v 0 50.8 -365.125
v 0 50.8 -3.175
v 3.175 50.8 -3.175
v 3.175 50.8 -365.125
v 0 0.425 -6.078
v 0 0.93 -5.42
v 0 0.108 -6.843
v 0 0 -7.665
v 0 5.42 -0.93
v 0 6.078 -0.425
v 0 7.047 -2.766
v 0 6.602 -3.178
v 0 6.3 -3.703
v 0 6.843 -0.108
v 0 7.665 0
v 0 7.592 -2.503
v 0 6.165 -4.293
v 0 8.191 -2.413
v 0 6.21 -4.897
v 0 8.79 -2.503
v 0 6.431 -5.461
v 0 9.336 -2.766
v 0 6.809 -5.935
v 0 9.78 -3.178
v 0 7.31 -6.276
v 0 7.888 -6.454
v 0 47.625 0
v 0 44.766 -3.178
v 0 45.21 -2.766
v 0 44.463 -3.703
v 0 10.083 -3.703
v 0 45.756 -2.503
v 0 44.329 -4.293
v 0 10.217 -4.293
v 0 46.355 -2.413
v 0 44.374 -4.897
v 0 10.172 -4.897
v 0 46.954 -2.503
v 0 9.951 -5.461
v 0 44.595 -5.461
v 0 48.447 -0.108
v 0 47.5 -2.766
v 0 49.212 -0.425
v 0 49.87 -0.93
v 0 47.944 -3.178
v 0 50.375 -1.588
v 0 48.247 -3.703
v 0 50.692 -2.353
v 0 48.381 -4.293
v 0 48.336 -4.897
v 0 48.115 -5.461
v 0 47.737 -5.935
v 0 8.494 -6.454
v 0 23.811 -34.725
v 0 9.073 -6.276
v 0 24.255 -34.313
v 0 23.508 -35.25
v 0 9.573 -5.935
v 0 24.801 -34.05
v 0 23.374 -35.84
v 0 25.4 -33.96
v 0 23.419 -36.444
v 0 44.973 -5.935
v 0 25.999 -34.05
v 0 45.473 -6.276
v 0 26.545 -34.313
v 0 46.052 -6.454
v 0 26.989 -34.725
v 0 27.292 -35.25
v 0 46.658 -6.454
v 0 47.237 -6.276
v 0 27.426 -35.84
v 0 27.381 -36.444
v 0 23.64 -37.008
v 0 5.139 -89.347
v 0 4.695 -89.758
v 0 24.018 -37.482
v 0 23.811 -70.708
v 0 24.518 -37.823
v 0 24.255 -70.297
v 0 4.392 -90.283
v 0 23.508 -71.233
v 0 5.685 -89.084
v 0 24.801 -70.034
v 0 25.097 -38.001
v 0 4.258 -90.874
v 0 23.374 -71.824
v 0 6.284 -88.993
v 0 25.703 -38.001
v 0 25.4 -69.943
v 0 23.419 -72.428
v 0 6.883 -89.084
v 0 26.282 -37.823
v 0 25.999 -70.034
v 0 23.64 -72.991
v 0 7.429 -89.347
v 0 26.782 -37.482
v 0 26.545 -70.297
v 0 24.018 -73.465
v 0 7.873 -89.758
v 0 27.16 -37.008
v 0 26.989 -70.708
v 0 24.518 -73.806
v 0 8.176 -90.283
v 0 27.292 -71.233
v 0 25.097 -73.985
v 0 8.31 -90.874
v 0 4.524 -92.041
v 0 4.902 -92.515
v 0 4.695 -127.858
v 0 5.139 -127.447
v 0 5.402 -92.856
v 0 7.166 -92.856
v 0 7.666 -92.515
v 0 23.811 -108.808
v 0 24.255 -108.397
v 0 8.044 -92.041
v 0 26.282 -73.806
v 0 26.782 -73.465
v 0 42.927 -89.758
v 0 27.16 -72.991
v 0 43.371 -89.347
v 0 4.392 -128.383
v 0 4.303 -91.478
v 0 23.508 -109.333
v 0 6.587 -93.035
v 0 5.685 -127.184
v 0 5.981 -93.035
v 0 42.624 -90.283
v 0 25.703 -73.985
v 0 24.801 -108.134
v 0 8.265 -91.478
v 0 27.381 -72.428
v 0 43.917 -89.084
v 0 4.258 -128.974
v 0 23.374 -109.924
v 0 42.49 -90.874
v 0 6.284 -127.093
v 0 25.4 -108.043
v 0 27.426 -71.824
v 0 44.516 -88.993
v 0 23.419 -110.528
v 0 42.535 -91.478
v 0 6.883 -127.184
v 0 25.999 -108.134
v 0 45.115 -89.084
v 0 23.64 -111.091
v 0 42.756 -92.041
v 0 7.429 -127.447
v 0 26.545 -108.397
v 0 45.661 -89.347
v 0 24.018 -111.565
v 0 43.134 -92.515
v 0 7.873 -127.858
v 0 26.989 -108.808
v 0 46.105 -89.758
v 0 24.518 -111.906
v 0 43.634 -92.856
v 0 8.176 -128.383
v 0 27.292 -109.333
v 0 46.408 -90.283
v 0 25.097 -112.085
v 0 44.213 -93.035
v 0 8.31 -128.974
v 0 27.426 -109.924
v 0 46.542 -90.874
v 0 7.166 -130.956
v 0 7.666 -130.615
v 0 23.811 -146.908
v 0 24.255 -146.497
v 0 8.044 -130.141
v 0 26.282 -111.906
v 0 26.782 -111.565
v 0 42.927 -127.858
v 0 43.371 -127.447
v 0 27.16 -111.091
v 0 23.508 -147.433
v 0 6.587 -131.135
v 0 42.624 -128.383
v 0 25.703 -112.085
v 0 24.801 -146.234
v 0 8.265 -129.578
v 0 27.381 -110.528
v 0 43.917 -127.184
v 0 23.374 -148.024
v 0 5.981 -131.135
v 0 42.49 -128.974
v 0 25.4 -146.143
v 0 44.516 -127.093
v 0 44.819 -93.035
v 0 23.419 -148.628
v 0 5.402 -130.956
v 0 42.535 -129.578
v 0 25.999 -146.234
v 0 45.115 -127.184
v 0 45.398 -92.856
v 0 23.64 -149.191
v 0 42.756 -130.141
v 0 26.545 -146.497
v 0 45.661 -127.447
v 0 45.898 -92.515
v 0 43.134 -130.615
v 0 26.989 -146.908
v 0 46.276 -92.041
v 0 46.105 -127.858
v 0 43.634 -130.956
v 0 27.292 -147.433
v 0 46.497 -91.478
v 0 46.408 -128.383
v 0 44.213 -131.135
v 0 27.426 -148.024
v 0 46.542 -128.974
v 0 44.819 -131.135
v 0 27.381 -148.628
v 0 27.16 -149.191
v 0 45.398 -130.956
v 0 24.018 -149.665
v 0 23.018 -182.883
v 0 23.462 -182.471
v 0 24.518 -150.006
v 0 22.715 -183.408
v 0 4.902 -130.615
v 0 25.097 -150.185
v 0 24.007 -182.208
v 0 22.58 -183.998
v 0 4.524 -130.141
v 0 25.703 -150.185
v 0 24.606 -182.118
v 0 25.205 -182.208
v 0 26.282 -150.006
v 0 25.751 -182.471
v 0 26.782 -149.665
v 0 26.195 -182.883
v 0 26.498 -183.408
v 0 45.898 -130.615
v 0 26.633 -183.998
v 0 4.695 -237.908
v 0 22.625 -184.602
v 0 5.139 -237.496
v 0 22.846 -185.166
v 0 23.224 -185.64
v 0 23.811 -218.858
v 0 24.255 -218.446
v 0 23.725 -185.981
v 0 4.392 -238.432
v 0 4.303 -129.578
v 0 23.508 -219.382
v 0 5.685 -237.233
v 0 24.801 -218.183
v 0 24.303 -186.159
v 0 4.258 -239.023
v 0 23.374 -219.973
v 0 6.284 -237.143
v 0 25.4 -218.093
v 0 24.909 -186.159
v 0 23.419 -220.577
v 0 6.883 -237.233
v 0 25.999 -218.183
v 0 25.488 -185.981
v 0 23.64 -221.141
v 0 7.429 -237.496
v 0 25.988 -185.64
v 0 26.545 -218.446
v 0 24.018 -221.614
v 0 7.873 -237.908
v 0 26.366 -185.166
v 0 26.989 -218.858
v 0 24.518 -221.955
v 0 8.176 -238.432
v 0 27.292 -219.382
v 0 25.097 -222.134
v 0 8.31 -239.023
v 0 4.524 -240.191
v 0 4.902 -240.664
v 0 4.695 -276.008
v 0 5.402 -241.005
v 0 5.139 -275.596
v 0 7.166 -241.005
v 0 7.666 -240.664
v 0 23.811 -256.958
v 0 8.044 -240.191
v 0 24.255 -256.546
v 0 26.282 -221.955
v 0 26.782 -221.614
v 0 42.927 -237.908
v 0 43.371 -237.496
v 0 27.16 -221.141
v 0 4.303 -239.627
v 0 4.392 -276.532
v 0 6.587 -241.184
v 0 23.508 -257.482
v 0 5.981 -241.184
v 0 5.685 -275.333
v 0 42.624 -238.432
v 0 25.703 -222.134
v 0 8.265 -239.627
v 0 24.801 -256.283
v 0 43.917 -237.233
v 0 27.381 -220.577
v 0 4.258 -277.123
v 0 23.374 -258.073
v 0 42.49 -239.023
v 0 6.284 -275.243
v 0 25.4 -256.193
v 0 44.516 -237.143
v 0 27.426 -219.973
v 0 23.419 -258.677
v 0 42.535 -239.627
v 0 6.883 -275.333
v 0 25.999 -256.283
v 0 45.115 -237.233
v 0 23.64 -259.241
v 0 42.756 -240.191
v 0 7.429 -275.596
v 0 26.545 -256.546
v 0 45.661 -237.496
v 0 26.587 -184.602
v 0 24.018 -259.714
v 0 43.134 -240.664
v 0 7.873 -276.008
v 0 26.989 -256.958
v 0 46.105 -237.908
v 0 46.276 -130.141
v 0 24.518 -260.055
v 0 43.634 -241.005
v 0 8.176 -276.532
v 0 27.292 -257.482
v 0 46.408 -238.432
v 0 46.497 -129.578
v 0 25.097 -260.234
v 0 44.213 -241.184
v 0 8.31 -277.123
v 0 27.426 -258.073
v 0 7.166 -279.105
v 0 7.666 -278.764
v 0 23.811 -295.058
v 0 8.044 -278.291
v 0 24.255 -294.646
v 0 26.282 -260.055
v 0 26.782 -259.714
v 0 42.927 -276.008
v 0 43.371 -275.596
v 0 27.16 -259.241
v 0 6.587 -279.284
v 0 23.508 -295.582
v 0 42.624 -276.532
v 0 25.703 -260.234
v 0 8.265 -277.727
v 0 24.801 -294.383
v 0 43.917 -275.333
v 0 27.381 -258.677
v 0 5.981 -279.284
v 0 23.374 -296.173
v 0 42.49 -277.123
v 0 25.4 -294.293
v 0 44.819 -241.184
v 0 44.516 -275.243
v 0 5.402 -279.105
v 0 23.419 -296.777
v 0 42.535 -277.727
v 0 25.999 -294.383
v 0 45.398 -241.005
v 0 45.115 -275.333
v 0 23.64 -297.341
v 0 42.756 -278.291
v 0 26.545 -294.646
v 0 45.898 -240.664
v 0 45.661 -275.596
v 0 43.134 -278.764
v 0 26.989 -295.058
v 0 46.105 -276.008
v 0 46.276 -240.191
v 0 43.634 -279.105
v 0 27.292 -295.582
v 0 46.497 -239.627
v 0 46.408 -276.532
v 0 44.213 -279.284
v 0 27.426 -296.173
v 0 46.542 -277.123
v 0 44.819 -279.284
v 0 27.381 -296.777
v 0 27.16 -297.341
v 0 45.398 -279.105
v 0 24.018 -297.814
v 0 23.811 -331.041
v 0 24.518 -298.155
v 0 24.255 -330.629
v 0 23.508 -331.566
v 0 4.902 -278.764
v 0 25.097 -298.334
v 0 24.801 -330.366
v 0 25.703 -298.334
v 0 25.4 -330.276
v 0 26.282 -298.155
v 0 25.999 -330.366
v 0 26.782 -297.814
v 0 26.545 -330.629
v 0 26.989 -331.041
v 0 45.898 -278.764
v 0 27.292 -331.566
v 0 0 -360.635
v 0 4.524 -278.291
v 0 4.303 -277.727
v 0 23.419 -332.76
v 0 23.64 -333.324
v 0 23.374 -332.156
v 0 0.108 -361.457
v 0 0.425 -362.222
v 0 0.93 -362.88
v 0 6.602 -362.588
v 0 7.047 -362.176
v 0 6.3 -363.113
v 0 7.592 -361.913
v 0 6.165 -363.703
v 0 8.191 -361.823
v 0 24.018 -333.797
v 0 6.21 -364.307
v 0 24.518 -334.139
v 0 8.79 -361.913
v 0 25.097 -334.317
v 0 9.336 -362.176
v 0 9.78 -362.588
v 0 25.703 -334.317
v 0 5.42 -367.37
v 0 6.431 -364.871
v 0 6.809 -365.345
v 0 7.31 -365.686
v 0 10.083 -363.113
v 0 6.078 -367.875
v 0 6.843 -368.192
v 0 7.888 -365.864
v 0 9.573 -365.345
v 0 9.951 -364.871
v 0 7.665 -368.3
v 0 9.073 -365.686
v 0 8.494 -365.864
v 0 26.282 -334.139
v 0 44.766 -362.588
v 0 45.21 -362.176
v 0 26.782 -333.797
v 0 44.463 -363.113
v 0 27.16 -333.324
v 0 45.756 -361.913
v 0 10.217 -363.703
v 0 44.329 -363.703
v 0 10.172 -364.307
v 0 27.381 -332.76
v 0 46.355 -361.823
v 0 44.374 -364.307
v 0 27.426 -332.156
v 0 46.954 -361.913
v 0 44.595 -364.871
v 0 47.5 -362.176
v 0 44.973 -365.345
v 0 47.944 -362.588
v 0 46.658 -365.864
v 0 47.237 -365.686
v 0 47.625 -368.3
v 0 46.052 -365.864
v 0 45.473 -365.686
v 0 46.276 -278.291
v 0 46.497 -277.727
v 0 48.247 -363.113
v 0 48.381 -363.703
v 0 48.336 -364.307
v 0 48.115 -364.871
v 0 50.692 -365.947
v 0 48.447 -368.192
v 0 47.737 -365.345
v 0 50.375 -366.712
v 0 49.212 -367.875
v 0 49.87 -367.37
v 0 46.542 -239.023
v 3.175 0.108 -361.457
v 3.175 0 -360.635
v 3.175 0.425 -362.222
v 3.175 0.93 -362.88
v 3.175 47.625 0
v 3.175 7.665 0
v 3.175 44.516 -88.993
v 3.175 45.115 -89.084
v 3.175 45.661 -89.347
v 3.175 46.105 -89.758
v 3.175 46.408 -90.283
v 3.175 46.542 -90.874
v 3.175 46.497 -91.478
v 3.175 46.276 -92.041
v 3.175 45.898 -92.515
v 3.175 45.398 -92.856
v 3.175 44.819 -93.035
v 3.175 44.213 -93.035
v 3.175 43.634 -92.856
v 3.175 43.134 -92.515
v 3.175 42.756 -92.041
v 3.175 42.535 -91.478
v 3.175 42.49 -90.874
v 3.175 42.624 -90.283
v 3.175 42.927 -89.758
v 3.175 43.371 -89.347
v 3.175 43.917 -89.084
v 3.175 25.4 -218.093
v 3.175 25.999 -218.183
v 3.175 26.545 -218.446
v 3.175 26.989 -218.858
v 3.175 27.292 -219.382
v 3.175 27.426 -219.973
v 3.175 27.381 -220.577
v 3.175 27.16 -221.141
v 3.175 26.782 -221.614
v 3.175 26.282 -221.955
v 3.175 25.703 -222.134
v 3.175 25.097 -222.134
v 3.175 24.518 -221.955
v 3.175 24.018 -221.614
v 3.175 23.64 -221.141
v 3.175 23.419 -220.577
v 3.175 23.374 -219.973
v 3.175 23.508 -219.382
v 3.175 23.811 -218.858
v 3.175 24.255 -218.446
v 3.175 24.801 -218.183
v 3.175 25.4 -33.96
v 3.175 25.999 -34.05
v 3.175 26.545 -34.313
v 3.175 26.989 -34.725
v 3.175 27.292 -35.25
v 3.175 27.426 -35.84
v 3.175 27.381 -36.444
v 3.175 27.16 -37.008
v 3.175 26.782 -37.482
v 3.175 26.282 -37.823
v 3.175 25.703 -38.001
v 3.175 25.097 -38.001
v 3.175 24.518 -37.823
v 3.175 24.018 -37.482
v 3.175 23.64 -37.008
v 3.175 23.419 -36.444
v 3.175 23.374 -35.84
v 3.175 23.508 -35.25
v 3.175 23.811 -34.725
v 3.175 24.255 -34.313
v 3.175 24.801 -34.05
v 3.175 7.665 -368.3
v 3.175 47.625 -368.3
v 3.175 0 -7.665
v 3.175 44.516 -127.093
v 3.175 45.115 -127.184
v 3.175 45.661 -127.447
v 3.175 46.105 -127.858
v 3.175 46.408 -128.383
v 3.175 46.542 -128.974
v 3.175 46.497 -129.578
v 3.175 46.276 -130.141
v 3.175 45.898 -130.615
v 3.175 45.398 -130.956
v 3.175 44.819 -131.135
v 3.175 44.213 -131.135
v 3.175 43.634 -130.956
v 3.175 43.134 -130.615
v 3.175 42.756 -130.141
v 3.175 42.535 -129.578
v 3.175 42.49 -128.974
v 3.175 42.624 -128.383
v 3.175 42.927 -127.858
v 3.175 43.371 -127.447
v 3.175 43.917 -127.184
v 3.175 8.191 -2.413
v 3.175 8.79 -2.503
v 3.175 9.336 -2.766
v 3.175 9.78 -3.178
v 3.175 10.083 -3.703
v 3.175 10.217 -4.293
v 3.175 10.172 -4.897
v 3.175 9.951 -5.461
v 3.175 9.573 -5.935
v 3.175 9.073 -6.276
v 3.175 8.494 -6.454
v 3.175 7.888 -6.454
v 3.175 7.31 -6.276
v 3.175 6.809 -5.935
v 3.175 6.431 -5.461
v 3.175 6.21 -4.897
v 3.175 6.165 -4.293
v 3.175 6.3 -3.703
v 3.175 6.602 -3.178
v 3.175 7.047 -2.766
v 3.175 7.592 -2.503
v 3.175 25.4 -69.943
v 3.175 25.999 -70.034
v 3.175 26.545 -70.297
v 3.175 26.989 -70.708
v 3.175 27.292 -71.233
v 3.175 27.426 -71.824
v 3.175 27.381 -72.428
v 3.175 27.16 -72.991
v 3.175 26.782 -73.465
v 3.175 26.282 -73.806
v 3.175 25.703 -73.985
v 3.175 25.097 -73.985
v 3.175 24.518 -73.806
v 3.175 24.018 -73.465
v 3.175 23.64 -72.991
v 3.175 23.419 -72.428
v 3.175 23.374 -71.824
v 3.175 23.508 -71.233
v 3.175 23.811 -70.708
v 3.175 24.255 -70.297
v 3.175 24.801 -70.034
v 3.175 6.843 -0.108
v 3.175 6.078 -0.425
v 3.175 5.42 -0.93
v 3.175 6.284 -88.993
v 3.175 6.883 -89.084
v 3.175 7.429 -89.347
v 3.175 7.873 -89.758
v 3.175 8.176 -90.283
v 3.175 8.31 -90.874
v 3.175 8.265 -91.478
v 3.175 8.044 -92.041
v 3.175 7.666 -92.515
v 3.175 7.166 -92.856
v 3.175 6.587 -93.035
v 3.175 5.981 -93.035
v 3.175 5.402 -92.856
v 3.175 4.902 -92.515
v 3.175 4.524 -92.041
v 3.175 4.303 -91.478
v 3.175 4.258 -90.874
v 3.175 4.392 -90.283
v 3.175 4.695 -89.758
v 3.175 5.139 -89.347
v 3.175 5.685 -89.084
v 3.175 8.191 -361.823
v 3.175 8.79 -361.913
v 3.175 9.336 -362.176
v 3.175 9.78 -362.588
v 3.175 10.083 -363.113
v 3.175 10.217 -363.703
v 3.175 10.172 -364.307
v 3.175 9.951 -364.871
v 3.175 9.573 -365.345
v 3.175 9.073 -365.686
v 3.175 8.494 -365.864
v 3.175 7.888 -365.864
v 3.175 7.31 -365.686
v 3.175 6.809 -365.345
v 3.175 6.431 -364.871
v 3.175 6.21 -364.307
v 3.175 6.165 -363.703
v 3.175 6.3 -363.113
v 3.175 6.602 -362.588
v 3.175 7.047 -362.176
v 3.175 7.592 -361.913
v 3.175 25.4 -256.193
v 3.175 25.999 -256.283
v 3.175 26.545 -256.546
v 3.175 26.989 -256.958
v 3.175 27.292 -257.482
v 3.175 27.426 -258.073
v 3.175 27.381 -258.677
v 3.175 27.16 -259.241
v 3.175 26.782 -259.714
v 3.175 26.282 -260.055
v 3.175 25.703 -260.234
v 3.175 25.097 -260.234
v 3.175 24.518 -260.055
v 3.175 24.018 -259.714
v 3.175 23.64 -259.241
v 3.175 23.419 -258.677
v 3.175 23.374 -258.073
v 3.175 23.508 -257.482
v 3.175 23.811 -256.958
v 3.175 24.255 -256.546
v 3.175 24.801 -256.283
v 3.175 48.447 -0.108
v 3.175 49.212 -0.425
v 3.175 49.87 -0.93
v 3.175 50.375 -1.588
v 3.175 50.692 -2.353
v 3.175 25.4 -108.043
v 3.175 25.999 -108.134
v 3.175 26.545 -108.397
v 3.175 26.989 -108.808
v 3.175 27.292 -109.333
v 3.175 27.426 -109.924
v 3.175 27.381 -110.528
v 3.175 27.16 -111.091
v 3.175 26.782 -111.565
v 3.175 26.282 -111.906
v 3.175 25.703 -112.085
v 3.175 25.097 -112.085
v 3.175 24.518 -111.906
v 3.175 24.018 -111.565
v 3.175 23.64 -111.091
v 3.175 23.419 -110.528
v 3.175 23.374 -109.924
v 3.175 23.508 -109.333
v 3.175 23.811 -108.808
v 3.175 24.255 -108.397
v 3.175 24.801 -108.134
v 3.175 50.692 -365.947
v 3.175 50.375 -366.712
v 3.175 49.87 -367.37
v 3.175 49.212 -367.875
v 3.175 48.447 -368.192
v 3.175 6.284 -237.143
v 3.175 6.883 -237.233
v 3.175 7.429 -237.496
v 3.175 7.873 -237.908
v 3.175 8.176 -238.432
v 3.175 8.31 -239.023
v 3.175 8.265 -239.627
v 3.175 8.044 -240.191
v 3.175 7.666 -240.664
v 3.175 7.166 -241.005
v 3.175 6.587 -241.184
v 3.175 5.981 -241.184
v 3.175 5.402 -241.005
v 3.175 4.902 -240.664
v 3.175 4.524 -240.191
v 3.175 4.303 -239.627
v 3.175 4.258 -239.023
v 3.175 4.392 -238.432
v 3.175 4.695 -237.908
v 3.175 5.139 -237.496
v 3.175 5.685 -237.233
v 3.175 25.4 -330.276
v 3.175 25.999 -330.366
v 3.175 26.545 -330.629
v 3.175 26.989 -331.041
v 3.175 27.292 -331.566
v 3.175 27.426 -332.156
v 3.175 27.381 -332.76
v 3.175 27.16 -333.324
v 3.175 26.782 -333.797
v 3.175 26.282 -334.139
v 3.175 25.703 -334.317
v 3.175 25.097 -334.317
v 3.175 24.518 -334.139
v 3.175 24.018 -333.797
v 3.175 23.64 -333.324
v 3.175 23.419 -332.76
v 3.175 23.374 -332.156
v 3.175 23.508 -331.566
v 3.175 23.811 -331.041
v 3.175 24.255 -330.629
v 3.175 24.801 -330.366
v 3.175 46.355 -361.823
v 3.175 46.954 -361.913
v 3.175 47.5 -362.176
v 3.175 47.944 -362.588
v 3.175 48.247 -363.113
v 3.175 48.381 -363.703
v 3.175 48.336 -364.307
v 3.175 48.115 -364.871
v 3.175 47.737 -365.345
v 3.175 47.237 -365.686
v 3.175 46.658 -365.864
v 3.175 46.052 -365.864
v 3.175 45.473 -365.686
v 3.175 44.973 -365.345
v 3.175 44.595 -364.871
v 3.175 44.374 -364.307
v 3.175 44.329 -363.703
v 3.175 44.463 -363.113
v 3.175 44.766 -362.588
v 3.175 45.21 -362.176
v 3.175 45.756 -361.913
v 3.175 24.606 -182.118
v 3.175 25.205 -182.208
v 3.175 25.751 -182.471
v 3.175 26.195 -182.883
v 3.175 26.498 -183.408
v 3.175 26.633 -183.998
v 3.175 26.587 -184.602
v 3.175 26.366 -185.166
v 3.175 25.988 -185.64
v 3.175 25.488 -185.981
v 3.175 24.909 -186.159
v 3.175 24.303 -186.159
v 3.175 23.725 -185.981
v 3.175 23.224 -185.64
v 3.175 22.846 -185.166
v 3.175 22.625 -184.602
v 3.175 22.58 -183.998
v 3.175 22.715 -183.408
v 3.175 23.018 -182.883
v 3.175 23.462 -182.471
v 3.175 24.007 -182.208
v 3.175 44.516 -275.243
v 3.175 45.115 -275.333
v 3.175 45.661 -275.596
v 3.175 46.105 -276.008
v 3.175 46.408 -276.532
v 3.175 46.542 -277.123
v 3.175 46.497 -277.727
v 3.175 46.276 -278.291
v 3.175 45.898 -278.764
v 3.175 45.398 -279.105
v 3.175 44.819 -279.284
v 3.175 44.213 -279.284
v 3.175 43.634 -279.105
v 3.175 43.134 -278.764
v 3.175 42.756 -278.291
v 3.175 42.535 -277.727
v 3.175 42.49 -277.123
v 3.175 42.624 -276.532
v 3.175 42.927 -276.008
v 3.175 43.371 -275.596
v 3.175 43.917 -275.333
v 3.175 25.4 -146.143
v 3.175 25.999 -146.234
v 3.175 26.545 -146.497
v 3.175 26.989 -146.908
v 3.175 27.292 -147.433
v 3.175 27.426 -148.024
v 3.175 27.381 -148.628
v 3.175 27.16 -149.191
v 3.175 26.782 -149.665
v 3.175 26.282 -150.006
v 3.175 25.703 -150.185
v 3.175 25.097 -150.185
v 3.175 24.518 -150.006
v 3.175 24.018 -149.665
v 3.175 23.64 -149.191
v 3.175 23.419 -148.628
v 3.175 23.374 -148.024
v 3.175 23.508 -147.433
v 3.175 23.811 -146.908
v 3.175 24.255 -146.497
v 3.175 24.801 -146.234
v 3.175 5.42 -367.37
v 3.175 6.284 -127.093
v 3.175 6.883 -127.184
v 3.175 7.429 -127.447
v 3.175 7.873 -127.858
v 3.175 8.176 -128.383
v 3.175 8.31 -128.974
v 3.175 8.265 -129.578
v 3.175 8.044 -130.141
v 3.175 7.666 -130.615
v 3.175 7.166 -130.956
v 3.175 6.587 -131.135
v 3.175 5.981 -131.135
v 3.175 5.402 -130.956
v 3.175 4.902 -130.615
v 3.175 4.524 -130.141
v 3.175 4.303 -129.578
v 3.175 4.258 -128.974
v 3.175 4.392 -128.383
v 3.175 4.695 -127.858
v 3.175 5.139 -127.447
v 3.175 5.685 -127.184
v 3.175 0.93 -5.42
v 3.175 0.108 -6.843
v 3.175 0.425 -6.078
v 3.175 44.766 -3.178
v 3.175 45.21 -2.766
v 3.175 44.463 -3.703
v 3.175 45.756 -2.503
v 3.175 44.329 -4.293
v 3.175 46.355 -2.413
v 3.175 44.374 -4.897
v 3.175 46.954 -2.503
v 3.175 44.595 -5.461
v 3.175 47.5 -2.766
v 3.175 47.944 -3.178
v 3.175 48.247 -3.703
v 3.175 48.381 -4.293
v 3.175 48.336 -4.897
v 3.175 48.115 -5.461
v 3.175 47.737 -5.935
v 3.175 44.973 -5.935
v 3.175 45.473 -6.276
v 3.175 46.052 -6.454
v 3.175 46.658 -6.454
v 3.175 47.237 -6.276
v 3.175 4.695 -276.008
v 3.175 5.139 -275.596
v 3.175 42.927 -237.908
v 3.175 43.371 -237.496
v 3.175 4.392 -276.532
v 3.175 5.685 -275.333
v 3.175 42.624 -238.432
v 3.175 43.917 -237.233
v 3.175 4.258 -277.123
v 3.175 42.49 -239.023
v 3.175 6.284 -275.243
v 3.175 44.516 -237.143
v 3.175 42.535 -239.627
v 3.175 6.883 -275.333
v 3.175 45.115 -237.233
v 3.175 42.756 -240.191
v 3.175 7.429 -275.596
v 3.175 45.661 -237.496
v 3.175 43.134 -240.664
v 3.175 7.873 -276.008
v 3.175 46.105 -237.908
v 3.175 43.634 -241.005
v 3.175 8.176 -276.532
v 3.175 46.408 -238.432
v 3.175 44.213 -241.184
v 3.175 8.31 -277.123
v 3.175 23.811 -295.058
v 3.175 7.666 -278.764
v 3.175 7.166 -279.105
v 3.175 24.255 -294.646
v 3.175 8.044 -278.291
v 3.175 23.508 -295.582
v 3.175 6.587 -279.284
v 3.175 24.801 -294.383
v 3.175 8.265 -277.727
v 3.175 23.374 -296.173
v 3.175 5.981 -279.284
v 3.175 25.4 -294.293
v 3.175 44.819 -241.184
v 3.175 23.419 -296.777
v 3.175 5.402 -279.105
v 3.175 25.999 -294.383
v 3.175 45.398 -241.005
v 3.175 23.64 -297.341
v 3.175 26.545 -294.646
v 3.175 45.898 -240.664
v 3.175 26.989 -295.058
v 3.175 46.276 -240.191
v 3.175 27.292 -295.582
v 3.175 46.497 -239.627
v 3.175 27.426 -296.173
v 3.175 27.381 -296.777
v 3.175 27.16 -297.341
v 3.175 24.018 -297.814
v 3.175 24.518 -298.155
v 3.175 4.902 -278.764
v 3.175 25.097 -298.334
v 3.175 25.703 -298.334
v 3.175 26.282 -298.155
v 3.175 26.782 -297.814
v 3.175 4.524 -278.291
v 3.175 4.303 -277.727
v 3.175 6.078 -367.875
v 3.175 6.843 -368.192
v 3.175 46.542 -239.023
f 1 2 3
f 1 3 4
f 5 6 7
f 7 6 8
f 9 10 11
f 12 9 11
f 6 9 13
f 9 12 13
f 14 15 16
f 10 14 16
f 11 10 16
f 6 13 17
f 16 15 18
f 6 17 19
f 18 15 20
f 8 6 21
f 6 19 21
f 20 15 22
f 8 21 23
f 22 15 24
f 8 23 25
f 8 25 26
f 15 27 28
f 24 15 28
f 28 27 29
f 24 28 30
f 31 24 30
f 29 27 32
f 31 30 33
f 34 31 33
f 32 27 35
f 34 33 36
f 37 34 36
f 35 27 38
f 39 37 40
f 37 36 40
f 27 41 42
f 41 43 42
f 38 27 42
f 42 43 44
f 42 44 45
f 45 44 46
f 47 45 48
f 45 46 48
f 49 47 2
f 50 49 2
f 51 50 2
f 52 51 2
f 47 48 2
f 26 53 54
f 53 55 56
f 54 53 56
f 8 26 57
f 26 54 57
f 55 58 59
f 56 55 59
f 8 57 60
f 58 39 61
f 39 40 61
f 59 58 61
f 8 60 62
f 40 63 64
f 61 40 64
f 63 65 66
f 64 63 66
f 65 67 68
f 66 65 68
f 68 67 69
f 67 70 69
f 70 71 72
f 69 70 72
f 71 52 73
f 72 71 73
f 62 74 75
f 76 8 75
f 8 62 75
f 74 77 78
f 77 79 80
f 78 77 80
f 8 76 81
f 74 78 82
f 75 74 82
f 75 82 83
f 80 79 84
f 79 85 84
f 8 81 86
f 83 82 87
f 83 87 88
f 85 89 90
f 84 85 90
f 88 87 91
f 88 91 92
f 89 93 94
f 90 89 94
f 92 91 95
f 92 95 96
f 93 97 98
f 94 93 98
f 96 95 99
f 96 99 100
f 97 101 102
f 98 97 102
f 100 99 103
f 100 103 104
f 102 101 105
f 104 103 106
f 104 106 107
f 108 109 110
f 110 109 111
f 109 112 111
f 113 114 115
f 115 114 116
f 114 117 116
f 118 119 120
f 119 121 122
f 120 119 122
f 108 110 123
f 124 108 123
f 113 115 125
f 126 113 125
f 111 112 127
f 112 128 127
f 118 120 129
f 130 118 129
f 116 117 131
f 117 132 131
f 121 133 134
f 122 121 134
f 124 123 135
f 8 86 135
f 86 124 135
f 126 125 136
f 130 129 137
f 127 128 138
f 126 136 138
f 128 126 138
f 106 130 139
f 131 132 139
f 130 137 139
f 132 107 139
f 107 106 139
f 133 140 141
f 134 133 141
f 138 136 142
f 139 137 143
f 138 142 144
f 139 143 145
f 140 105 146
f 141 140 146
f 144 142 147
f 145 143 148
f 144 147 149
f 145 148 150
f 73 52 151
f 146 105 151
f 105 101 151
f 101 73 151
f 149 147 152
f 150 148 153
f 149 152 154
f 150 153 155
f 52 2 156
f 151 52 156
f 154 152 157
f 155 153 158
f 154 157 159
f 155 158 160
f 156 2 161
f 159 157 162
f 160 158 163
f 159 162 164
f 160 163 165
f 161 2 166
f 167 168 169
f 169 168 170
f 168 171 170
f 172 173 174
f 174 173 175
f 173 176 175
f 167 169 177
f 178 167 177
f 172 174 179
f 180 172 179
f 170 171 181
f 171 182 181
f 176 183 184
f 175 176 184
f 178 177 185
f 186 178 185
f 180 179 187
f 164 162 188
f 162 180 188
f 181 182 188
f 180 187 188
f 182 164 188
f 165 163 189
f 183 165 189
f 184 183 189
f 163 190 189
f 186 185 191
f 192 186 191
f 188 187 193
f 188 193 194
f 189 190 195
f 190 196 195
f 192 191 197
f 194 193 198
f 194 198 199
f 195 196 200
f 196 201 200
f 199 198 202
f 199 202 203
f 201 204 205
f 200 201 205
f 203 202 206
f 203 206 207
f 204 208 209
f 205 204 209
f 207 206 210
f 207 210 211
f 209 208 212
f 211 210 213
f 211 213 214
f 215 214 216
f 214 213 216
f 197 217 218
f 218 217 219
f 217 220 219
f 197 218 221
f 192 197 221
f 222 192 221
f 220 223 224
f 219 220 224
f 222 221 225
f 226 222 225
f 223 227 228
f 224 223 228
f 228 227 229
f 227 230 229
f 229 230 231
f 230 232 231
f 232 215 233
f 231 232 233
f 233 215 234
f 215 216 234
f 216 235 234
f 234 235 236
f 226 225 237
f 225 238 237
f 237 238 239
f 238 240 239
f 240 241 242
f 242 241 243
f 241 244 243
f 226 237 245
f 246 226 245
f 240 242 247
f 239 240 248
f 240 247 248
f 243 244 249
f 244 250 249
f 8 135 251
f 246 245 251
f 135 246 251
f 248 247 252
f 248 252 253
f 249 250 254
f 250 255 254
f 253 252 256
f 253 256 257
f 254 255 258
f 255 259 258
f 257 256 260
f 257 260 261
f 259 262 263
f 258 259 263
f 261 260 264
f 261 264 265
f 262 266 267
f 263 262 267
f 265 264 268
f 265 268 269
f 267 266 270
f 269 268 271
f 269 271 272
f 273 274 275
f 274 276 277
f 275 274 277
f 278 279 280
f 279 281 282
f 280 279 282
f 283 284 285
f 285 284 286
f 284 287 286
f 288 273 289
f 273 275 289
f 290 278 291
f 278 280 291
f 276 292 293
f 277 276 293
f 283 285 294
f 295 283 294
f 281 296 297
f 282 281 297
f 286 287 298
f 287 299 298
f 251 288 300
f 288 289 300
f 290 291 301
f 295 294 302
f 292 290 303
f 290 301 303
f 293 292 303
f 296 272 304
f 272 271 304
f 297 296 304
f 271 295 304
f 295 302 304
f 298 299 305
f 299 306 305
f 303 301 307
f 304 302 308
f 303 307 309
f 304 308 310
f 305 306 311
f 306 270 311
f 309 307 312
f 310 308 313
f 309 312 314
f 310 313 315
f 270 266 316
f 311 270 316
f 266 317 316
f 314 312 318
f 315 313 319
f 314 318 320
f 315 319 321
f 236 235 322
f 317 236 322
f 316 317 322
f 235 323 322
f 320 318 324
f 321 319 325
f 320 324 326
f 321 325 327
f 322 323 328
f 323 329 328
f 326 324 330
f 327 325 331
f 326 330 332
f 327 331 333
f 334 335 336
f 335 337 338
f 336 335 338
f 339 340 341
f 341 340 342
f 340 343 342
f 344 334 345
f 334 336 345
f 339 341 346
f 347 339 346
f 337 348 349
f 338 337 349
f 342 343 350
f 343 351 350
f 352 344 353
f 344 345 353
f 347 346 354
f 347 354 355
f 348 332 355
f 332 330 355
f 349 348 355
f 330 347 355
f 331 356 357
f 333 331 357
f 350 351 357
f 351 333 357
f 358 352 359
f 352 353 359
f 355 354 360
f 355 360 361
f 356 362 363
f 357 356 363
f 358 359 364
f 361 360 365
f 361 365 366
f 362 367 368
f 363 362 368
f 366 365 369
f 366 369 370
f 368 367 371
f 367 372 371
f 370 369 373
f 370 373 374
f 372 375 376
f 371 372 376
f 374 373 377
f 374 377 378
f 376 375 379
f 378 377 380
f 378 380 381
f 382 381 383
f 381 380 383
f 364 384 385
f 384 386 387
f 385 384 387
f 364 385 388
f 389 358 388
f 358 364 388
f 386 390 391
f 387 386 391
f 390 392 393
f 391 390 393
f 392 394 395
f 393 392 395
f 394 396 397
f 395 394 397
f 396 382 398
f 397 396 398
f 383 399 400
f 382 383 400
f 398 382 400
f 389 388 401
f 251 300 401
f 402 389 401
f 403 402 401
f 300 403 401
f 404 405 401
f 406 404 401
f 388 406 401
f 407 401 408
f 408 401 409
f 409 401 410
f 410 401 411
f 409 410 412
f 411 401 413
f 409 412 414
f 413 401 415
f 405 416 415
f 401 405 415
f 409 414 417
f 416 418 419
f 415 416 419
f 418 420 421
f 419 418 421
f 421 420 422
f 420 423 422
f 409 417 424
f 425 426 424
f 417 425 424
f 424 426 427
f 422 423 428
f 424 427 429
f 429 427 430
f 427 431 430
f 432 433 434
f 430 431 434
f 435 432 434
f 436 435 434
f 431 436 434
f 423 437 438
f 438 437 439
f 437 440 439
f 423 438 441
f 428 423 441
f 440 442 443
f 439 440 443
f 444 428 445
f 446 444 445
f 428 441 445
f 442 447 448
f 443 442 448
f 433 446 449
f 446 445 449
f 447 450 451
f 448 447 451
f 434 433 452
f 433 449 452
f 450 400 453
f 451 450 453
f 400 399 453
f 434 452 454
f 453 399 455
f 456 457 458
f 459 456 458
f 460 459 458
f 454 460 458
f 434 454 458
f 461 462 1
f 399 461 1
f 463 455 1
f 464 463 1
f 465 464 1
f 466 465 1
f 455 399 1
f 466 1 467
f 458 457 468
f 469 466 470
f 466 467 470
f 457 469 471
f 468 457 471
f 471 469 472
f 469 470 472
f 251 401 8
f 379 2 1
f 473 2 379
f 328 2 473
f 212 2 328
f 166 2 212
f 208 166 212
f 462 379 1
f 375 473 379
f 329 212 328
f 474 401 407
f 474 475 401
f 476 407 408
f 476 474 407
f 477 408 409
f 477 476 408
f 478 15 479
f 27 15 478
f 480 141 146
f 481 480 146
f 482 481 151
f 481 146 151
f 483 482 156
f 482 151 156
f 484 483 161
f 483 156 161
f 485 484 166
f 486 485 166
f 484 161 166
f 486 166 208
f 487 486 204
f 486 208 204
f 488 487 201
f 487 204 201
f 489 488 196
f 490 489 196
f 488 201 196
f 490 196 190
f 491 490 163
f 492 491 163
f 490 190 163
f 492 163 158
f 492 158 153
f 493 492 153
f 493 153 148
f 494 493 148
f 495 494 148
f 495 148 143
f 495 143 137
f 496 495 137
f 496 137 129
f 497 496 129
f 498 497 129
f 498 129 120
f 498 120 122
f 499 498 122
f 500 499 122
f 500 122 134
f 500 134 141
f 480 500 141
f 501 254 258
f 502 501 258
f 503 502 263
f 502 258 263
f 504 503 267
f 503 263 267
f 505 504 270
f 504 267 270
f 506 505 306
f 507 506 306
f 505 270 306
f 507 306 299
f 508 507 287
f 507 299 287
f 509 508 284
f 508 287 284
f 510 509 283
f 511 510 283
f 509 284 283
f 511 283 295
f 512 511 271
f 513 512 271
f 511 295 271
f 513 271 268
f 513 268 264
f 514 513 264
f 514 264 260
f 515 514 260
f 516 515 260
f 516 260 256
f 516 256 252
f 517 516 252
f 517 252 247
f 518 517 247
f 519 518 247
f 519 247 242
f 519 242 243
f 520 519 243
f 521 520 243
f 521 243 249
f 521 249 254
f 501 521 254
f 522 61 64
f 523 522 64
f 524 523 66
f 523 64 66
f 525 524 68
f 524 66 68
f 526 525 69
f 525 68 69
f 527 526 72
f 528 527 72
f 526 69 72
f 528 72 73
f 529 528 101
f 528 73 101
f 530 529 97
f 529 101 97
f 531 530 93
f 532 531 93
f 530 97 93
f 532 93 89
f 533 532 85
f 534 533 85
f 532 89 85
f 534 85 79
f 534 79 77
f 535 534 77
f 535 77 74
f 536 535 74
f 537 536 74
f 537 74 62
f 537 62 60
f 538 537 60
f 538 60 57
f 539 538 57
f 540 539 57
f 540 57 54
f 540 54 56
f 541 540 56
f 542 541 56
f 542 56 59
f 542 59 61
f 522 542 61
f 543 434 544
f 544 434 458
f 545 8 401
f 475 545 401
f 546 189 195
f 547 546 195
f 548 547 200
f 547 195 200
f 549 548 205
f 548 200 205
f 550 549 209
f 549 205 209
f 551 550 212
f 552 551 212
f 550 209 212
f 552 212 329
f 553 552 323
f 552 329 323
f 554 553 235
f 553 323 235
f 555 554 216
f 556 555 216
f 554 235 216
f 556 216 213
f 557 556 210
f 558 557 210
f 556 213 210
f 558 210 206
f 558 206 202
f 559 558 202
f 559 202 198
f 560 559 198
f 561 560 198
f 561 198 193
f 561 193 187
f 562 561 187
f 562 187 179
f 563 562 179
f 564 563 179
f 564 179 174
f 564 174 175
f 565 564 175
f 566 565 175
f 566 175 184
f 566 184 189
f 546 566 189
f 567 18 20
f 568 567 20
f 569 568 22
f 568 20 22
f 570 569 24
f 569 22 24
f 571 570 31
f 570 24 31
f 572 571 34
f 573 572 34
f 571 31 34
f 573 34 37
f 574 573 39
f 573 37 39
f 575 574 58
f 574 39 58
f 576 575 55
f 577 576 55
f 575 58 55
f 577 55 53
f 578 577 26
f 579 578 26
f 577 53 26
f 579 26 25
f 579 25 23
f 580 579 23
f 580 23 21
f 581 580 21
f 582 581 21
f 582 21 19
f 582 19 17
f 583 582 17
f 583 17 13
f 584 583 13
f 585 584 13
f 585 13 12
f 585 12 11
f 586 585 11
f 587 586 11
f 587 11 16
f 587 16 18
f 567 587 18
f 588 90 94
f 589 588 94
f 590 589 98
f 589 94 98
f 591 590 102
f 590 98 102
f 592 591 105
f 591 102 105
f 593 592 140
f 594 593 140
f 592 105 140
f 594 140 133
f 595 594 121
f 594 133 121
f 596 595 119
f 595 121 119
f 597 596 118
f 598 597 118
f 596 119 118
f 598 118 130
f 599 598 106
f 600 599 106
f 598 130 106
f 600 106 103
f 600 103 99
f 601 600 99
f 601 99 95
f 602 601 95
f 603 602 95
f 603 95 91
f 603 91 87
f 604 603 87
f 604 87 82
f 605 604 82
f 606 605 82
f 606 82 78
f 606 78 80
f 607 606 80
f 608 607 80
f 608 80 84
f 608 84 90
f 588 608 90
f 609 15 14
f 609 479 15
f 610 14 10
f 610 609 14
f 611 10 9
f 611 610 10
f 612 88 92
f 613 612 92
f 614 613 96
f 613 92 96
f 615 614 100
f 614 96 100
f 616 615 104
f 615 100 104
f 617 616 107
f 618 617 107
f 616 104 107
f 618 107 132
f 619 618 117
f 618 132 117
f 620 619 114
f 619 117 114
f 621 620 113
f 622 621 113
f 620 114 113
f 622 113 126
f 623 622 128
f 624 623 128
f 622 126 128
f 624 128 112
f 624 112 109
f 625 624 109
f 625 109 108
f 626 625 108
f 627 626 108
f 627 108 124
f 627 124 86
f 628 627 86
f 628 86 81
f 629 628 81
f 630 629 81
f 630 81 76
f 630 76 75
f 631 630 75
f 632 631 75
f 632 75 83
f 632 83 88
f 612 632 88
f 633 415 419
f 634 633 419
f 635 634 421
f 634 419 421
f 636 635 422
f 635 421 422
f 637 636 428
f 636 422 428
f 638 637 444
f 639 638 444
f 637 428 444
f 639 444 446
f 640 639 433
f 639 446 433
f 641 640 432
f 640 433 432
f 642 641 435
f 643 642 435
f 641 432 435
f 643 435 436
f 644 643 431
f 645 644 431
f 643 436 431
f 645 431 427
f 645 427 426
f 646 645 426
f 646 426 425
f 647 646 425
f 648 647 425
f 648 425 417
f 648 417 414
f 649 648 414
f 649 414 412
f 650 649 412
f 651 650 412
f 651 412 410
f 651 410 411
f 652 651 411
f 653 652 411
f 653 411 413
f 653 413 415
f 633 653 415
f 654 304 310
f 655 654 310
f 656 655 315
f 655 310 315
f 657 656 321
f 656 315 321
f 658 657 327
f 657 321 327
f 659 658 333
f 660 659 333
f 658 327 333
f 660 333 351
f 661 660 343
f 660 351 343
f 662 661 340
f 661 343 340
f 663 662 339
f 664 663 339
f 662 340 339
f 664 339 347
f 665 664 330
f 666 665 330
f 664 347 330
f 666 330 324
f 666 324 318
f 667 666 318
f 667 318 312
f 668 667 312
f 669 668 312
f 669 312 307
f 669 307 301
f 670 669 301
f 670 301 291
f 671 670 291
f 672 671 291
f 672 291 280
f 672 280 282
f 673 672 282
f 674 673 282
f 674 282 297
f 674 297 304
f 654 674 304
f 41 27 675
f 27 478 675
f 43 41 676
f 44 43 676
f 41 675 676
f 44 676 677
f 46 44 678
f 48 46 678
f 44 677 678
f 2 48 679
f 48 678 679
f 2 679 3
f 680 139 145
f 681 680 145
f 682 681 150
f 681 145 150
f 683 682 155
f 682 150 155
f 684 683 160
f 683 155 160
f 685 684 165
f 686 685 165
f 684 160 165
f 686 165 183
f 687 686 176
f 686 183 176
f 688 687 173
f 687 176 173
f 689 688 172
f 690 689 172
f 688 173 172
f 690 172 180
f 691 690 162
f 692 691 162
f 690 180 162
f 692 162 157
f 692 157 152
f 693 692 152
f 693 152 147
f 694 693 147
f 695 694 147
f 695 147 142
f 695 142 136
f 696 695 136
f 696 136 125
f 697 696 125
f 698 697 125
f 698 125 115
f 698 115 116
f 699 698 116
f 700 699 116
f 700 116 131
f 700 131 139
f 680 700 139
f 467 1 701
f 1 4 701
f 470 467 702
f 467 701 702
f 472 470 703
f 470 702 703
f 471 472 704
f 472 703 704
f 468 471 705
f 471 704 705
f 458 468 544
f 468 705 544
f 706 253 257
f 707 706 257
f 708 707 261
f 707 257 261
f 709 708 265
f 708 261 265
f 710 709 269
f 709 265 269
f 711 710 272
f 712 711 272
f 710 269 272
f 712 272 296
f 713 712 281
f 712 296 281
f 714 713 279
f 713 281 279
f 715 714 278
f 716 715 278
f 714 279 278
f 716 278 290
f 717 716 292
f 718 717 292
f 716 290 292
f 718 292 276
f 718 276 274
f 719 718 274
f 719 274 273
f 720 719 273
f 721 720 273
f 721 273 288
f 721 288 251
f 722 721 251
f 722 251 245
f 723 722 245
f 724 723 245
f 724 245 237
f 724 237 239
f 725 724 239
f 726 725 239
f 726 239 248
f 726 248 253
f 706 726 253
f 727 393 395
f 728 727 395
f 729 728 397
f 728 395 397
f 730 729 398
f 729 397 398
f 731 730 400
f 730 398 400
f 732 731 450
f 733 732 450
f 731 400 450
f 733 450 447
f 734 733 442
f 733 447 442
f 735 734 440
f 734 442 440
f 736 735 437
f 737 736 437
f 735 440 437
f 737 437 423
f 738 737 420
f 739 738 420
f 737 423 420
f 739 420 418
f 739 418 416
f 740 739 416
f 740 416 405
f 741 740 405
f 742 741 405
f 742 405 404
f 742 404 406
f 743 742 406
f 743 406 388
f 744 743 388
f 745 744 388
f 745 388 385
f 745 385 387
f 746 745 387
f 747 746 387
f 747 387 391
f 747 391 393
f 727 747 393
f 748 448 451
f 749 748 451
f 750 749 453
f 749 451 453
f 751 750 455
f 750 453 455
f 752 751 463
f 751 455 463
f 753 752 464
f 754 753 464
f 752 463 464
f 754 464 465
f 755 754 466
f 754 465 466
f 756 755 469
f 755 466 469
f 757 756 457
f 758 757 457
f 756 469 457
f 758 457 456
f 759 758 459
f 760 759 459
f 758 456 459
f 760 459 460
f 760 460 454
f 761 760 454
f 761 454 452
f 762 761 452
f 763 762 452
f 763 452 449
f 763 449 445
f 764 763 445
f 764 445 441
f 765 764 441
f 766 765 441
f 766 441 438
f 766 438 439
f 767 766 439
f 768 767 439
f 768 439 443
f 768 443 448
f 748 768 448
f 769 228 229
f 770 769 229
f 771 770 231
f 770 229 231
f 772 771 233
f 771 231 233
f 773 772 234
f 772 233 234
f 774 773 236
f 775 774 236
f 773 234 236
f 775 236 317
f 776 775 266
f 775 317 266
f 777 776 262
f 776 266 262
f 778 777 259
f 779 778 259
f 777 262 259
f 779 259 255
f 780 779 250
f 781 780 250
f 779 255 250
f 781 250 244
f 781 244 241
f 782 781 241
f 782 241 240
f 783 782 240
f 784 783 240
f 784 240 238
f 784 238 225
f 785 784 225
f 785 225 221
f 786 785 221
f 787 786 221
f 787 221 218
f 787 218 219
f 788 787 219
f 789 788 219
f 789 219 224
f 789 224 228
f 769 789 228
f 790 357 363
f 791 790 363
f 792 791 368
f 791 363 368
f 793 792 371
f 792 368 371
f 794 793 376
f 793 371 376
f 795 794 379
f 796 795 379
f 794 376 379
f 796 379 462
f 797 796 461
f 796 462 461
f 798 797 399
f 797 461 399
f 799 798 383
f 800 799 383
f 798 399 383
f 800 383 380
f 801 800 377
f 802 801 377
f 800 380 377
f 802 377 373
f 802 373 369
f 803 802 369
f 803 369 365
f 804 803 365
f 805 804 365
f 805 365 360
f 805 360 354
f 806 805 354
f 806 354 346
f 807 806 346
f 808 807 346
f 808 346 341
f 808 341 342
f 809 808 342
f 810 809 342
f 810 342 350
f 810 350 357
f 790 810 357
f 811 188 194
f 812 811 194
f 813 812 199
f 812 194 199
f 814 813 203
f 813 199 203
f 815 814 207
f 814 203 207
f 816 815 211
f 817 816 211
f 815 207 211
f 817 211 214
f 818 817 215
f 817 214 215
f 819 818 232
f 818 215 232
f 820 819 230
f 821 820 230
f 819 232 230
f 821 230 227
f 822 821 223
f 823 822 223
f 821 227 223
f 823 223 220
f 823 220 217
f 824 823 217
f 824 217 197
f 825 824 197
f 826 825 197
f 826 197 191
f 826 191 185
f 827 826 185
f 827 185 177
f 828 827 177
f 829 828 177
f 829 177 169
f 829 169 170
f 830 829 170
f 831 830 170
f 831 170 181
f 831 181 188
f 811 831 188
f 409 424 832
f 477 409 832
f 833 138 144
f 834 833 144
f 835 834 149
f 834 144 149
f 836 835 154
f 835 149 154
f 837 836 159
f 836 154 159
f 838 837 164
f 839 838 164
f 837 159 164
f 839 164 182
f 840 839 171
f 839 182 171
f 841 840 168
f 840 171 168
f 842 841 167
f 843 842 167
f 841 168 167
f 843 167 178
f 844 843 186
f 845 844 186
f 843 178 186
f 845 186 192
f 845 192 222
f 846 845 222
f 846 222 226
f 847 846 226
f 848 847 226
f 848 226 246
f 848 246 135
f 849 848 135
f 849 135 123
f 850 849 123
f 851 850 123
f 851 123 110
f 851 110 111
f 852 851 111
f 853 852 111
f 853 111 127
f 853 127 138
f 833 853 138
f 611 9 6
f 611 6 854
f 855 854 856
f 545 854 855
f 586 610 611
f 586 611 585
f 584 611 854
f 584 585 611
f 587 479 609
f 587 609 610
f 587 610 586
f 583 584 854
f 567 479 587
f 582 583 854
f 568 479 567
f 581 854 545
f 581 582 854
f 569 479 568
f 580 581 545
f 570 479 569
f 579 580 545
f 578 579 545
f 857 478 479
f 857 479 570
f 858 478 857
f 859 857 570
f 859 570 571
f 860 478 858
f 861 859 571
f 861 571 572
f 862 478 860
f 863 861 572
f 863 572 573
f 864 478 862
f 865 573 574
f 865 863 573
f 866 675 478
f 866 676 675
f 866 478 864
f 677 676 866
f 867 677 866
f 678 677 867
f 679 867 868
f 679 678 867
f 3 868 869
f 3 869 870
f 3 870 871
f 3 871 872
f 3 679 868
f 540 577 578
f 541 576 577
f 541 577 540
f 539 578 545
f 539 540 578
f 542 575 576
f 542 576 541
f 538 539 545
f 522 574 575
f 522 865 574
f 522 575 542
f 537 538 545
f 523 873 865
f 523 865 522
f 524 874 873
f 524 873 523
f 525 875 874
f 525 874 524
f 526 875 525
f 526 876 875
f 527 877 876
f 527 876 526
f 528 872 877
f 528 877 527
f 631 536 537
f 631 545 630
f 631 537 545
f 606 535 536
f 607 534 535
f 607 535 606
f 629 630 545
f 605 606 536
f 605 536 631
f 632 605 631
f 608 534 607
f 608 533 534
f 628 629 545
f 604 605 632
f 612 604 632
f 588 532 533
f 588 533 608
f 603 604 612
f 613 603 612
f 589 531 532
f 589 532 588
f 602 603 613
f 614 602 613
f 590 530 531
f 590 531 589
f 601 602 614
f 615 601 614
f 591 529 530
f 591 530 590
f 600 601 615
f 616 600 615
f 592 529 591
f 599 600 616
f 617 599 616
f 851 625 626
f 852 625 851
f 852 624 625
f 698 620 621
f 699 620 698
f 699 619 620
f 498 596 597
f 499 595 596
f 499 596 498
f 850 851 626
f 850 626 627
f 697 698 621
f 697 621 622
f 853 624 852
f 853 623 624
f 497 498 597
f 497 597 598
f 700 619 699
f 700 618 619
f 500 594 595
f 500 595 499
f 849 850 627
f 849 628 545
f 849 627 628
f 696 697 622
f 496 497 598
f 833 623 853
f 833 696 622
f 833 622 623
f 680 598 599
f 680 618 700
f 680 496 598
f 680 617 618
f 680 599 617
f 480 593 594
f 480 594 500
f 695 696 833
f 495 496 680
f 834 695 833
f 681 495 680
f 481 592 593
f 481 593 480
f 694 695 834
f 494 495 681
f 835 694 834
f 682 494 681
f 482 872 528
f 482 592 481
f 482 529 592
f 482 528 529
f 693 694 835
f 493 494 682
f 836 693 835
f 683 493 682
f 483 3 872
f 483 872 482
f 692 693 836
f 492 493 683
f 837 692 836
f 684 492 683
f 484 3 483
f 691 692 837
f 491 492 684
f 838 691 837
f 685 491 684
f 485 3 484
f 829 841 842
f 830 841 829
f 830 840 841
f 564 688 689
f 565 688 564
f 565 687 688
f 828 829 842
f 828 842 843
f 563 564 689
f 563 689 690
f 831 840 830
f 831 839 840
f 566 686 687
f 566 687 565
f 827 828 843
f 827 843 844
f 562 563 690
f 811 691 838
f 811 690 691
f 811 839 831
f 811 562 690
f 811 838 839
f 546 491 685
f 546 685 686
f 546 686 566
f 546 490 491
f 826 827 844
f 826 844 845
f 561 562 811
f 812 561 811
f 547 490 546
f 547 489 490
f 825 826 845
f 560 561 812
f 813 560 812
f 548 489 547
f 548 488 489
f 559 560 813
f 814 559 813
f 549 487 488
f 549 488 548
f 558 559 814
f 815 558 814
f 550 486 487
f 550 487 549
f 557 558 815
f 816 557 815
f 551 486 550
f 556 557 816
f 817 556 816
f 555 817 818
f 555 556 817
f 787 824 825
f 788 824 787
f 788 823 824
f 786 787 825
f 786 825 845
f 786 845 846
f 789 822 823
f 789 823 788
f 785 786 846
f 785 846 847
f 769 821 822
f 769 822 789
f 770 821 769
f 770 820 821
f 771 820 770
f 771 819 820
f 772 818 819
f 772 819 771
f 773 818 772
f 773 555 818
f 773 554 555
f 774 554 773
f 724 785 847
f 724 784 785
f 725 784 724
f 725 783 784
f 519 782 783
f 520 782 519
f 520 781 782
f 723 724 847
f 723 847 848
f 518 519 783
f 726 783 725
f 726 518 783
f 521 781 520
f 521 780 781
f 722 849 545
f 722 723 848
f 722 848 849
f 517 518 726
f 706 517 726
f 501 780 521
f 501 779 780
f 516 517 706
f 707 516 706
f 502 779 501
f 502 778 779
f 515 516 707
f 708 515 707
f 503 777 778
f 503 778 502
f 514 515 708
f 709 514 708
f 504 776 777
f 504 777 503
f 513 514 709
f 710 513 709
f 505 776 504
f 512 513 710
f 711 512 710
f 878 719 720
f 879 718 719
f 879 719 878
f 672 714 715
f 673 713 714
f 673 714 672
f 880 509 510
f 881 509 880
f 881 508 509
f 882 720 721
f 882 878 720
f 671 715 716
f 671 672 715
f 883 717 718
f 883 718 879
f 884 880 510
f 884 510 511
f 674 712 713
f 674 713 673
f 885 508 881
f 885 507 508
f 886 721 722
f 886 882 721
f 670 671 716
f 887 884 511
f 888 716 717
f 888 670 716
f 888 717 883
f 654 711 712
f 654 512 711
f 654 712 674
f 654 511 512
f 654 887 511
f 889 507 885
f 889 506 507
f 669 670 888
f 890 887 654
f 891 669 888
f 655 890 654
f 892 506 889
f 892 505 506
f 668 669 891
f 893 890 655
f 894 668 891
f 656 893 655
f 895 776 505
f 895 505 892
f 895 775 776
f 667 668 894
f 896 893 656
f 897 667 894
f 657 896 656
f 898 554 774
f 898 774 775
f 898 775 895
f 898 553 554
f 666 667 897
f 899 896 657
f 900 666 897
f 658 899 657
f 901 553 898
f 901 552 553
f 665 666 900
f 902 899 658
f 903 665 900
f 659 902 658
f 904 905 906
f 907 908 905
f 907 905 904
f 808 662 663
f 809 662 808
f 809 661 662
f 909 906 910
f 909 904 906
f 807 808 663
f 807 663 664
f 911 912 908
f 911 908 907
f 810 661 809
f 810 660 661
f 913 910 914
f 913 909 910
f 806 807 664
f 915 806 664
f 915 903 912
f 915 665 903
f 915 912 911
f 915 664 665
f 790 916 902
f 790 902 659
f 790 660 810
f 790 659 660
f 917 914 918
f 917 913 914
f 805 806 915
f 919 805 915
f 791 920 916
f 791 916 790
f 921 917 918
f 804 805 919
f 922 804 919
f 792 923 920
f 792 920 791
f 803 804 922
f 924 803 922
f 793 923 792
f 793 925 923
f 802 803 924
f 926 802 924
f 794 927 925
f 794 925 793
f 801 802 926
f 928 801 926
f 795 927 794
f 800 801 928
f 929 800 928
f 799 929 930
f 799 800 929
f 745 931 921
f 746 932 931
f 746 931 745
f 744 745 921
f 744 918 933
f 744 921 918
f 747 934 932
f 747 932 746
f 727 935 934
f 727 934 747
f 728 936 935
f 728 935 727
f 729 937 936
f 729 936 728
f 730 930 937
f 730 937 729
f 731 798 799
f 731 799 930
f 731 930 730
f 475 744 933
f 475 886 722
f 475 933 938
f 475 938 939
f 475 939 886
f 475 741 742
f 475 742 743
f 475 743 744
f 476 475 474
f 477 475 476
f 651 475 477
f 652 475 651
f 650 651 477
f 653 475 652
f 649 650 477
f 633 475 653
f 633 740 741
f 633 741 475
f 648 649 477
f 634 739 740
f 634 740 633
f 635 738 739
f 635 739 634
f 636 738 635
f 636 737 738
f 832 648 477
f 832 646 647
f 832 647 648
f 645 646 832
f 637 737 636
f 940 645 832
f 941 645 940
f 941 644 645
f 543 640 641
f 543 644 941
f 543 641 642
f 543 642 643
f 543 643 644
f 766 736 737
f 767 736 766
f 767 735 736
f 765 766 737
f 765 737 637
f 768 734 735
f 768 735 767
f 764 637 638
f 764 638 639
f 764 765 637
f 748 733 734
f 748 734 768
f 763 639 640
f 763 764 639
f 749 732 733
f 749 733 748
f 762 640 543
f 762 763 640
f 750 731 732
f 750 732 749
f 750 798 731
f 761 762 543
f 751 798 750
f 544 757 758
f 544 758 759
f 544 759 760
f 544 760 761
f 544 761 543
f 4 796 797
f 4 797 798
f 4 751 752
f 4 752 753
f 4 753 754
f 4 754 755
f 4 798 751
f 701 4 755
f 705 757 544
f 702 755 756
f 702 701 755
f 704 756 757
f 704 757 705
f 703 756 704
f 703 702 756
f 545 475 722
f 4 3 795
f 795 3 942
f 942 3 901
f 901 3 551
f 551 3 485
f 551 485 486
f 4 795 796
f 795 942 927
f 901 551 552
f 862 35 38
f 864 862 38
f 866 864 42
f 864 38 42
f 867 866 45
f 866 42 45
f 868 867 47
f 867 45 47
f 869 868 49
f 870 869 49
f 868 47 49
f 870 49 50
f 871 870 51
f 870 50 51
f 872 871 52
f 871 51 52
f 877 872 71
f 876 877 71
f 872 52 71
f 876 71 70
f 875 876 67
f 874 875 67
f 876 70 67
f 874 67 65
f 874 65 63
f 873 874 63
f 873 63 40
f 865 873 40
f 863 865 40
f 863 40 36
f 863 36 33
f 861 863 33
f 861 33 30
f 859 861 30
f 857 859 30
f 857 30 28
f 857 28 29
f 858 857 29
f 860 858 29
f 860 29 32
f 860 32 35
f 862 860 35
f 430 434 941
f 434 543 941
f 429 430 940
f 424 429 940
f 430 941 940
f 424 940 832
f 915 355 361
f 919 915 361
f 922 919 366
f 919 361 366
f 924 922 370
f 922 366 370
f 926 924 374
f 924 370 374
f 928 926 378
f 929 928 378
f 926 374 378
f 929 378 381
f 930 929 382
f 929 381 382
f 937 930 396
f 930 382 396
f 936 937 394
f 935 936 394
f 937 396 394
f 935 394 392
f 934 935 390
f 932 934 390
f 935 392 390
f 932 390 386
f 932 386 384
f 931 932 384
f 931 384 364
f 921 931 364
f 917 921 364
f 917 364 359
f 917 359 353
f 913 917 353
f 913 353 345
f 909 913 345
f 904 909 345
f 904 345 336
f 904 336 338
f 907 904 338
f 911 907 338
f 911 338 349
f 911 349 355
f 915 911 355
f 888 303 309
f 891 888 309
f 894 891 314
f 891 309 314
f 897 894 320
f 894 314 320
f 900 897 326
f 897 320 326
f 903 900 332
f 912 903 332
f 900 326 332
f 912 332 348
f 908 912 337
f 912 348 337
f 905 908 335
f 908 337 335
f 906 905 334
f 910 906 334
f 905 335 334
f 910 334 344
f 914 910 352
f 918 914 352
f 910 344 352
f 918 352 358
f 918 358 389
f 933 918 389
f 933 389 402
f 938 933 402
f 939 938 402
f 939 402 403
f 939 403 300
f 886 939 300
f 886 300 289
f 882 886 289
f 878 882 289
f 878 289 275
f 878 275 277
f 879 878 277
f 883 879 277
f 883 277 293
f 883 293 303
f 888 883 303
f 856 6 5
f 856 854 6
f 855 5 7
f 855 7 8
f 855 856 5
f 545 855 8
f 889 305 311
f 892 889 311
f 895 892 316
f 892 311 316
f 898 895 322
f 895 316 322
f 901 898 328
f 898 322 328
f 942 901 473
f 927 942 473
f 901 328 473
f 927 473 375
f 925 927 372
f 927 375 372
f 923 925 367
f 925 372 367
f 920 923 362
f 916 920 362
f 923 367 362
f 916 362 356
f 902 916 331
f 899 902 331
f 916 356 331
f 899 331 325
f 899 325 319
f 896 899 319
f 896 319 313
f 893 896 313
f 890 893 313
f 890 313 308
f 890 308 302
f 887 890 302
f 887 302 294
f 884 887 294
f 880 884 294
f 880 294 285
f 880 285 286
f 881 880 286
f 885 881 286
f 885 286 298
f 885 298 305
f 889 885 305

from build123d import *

# Parameters (mm, degrees)
SKETCH1_W                 = 368.3
SKETCH1_H                 = 50.8
BOSS_EXTRUDE1_DEPTH       = 3.175
CHAMFER1_SIZE             = 6.35
FILLET1_R                 = 3.175
F_8_0_16_DIAMETER_HOLE1_D = 4.064


with BuildPart() as part:
    # Sketch1 → Boss-Extrude1 (new body)
    with BuildSketch(Plane(origin=(0, 0, 0), x_dir=(0, 0, -1), z_dir=(1, 0, 0))):
        with Locations((184.15, 25.4)):
            Rectangle(SKETCH1_W, SKETCH1_H)
    extrude(amount=BOSS_EXTRUDE1_DEPTH)

    # Chamfer1
    chamfer1_edges = [part.edges().sort_by_distance(p)[0] for p in [
        (1.5875, 0, -368.3),
        (1.5875, 0, 0),
    ]]
    chamfer(chamfer1_edges, length=CHAMFER1_SIZE)

    # Fillet1
    fillet1_edges = [part.edges().sort_by_distance(p)[0] for p in [
        (1.5875, 6.35, -368.3),
        (1.5875, 0, -6.35),
        (1.5875, 0, -361.95),
        (1.5875, 6.35, 0),
        (1.5875, 50.8, 0),
        (1.5875, 50.8, -368.3),
    ]]
    fillet(fillet1_edges, radius=FILLET1_R)

    # #8 (0.16) Diameter Hole1 (through all)
    with Locations(Plane(origin=(3.175, 0, 0), x_dir=(0, 0, -1), z_dir=(1, 0, 0))):
        with Locations((91.025422327, 6.283968606), (91.025422327, 44.516031394), (71.975422327, 25.4), (35.992088994, 25.4), (148.175422327, 25.4), (129.125422327, 6.283968606), (110.075422327, 25.4), (129.125422327, 44.516031394), (184.15, 24.60625), (220.124577673, 25.4), (239.174577673, 6.283968606), (239.174577673, 44.516031394), (258.224577673, 25.4), (277.274577673, 6.283968606), (277.274577673, 44.516031394), (296.324577673, 25.4), (332.307911006, 25.4), (363.855, 46.355), (4.445, 46.355), (4.445, 8.191179285), (363.855, 8.191179285)):
            Hole(F_8_0_16_DIAMETER_HOLE1_D / 2)


solid = part.part
